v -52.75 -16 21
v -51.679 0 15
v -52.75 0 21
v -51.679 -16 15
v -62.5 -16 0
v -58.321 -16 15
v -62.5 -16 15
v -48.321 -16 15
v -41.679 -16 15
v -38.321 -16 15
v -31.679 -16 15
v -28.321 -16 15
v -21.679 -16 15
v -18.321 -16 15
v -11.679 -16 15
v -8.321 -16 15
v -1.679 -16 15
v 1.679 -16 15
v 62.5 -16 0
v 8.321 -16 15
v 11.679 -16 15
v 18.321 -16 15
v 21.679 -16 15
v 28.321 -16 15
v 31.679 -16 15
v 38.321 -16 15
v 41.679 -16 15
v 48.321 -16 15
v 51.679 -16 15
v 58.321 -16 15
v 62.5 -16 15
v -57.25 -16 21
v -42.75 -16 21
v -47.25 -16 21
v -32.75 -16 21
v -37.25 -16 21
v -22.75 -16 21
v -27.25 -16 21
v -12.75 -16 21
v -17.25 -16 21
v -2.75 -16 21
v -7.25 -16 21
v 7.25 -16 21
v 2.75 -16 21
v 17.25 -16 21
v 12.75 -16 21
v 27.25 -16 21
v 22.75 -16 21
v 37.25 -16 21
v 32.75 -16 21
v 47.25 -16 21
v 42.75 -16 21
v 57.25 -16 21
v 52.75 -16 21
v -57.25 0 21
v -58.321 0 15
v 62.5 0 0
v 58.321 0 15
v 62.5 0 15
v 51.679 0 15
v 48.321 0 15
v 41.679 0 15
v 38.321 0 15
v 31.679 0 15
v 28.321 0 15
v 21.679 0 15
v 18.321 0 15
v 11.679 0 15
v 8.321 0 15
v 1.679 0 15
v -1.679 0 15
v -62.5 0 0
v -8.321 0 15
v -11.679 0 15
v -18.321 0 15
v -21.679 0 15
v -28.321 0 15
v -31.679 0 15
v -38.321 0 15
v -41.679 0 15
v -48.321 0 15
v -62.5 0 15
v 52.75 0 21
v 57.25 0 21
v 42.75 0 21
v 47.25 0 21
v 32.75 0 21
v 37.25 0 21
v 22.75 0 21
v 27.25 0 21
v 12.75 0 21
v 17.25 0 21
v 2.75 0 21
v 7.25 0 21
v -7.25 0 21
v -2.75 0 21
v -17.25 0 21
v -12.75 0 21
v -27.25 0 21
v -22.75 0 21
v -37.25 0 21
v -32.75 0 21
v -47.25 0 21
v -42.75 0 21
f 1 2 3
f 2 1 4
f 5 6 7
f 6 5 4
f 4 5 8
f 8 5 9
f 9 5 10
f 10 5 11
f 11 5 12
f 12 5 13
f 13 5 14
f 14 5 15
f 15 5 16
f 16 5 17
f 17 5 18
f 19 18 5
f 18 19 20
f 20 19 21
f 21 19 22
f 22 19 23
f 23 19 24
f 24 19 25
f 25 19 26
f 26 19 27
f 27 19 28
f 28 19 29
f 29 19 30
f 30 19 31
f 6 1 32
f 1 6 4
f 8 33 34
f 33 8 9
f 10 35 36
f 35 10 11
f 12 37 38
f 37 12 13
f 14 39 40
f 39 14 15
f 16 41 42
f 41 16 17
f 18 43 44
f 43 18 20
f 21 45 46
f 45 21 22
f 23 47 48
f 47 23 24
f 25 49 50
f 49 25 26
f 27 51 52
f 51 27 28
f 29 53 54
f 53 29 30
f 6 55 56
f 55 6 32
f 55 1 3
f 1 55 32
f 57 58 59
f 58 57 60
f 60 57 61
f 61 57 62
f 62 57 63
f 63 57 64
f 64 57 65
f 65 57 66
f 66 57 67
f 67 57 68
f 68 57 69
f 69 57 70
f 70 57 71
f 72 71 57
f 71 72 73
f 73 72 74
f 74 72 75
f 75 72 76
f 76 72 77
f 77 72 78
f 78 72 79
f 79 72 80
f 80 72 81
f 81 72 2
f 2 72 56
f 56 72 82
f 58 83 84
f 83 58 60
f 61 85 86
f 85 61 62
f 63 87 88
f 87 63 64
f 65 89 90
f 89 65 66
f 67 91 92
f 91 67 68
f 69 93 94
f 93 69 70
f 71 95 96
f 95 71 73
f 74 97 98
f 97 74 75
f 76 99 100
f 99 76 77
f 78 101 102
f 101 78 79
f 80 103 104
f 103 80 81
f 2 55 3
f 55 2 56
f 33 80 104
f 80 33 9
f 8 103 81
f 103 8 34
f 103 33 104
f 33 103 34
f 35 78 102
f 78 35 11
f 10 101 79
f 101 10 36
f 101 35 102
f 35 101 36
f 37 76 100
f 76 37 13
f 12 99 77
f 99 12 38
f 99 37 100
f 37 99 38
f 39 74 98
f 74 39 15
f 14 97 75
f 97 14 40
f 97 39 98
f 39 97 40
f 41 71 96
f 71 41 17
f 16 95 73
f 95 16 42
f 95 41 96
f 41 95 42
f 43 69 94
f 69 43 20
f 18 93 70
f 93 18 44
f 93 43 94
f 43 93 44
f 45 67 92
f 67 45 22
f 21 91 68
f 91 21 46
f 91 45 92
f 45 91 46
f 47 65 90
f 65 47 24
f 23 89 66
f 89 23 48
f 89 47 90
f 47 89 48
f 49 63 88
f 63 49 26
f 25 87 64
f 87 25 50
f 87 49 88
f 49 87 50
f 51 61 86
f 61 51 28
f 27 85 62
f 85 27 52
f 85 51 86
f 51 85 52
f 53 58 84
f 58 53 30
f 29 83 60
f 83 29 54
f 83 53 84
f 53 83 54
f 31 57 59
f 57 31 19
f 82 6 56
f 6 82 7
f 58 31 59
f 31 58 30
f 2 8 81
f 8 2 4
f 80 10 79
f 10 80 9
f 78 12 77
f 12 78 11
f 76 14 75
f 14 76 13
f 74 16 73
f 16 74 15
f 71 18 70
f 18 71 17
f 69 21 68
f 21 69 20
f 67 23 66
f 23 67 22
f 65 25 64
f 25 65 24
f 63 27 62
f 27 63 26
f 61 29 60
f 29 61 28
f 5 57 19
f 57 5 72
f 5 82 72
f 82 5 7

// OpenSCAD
$fn = 32;

// ----------------------------------------------------------------------
// Toothed rack, 12 teeth
// 10 mm pitch, 6 mm teeth
// ----------------------------------------------------------------------

// --- parameters (mm) ---
bar_w = 16;     // bar width (Y)
bar_h = 15;     // bar height (Z)
teeth = 12;     // number of teeth
pitch = 10;     // tooth pitch
tooth_h = 6;    // tooth height above the bar
root_w = 7;     // tooth width at the root
crest_w = 4.5;  // tooth width at the crest

// --- derived feature positions (mm) ---
span = (teeth - 1) * pitch;  // = 110   distance between the outer teeth
bar_l = span + root_w + 8;   // = 125   bar length: teeth plus 4 mm at each end
tooth_x = -span / 2;         // = -55   X of the first tooth
height = bar_h + tooth_h;    // = 21   overall height
feature_centers = [
  [tooth_x + 0 * pitch, -bar_w / 2],
  [tooth_x + 1 * pitch, -bar_w / 2],
  [tooth_x + 2 * pitch, -bar_w / 2],
  [tooth_x + 3 * pitch, -bar_w / 2],
  [tooth_x + 4 * pitch, -bar_w / 2],
  [tooth_x + 5 * pitch, -bar_w / 2],
  [tooth_x + 6 * pitch, -bar_w / 2],
  [tooth_x + 7 * pitch, -bar_w / 2],
  [tooth_x + 8 * pitch, -bar_w / 2],
  [tooth_x + 9 * pitch, -bar_w / 2],
  [tooth_x + 10 * pitch, -bar_w / 2],
  [tooth_x + 11 * pitch, -bar_w / 2]
];   // tooth centre line, drives the tooth loop

// bar with a rack of teeth, one extruded trapezoium per centre
module rack_tooth() {
  linear_extrude(height = bar_w)
    polygon(points = [
      [0, 0],
      [root_w, 0],
      [root_w / 2 + crest_w / 2, tooth_h + 1],
      [root_w / 2 - crest_w / 2, tooth_h + 1]
    ]);
}

union() {
  translate([-bar_l / 2, -bar_w, 0]) cube([bar_l, bar_w, bar_h]);
  for (centre = feature_centers)
    translate([centre[0] - root_w / 2, 0, bar_h - 1]) rotate([90, 0, 0]) rack_tooth();
}
